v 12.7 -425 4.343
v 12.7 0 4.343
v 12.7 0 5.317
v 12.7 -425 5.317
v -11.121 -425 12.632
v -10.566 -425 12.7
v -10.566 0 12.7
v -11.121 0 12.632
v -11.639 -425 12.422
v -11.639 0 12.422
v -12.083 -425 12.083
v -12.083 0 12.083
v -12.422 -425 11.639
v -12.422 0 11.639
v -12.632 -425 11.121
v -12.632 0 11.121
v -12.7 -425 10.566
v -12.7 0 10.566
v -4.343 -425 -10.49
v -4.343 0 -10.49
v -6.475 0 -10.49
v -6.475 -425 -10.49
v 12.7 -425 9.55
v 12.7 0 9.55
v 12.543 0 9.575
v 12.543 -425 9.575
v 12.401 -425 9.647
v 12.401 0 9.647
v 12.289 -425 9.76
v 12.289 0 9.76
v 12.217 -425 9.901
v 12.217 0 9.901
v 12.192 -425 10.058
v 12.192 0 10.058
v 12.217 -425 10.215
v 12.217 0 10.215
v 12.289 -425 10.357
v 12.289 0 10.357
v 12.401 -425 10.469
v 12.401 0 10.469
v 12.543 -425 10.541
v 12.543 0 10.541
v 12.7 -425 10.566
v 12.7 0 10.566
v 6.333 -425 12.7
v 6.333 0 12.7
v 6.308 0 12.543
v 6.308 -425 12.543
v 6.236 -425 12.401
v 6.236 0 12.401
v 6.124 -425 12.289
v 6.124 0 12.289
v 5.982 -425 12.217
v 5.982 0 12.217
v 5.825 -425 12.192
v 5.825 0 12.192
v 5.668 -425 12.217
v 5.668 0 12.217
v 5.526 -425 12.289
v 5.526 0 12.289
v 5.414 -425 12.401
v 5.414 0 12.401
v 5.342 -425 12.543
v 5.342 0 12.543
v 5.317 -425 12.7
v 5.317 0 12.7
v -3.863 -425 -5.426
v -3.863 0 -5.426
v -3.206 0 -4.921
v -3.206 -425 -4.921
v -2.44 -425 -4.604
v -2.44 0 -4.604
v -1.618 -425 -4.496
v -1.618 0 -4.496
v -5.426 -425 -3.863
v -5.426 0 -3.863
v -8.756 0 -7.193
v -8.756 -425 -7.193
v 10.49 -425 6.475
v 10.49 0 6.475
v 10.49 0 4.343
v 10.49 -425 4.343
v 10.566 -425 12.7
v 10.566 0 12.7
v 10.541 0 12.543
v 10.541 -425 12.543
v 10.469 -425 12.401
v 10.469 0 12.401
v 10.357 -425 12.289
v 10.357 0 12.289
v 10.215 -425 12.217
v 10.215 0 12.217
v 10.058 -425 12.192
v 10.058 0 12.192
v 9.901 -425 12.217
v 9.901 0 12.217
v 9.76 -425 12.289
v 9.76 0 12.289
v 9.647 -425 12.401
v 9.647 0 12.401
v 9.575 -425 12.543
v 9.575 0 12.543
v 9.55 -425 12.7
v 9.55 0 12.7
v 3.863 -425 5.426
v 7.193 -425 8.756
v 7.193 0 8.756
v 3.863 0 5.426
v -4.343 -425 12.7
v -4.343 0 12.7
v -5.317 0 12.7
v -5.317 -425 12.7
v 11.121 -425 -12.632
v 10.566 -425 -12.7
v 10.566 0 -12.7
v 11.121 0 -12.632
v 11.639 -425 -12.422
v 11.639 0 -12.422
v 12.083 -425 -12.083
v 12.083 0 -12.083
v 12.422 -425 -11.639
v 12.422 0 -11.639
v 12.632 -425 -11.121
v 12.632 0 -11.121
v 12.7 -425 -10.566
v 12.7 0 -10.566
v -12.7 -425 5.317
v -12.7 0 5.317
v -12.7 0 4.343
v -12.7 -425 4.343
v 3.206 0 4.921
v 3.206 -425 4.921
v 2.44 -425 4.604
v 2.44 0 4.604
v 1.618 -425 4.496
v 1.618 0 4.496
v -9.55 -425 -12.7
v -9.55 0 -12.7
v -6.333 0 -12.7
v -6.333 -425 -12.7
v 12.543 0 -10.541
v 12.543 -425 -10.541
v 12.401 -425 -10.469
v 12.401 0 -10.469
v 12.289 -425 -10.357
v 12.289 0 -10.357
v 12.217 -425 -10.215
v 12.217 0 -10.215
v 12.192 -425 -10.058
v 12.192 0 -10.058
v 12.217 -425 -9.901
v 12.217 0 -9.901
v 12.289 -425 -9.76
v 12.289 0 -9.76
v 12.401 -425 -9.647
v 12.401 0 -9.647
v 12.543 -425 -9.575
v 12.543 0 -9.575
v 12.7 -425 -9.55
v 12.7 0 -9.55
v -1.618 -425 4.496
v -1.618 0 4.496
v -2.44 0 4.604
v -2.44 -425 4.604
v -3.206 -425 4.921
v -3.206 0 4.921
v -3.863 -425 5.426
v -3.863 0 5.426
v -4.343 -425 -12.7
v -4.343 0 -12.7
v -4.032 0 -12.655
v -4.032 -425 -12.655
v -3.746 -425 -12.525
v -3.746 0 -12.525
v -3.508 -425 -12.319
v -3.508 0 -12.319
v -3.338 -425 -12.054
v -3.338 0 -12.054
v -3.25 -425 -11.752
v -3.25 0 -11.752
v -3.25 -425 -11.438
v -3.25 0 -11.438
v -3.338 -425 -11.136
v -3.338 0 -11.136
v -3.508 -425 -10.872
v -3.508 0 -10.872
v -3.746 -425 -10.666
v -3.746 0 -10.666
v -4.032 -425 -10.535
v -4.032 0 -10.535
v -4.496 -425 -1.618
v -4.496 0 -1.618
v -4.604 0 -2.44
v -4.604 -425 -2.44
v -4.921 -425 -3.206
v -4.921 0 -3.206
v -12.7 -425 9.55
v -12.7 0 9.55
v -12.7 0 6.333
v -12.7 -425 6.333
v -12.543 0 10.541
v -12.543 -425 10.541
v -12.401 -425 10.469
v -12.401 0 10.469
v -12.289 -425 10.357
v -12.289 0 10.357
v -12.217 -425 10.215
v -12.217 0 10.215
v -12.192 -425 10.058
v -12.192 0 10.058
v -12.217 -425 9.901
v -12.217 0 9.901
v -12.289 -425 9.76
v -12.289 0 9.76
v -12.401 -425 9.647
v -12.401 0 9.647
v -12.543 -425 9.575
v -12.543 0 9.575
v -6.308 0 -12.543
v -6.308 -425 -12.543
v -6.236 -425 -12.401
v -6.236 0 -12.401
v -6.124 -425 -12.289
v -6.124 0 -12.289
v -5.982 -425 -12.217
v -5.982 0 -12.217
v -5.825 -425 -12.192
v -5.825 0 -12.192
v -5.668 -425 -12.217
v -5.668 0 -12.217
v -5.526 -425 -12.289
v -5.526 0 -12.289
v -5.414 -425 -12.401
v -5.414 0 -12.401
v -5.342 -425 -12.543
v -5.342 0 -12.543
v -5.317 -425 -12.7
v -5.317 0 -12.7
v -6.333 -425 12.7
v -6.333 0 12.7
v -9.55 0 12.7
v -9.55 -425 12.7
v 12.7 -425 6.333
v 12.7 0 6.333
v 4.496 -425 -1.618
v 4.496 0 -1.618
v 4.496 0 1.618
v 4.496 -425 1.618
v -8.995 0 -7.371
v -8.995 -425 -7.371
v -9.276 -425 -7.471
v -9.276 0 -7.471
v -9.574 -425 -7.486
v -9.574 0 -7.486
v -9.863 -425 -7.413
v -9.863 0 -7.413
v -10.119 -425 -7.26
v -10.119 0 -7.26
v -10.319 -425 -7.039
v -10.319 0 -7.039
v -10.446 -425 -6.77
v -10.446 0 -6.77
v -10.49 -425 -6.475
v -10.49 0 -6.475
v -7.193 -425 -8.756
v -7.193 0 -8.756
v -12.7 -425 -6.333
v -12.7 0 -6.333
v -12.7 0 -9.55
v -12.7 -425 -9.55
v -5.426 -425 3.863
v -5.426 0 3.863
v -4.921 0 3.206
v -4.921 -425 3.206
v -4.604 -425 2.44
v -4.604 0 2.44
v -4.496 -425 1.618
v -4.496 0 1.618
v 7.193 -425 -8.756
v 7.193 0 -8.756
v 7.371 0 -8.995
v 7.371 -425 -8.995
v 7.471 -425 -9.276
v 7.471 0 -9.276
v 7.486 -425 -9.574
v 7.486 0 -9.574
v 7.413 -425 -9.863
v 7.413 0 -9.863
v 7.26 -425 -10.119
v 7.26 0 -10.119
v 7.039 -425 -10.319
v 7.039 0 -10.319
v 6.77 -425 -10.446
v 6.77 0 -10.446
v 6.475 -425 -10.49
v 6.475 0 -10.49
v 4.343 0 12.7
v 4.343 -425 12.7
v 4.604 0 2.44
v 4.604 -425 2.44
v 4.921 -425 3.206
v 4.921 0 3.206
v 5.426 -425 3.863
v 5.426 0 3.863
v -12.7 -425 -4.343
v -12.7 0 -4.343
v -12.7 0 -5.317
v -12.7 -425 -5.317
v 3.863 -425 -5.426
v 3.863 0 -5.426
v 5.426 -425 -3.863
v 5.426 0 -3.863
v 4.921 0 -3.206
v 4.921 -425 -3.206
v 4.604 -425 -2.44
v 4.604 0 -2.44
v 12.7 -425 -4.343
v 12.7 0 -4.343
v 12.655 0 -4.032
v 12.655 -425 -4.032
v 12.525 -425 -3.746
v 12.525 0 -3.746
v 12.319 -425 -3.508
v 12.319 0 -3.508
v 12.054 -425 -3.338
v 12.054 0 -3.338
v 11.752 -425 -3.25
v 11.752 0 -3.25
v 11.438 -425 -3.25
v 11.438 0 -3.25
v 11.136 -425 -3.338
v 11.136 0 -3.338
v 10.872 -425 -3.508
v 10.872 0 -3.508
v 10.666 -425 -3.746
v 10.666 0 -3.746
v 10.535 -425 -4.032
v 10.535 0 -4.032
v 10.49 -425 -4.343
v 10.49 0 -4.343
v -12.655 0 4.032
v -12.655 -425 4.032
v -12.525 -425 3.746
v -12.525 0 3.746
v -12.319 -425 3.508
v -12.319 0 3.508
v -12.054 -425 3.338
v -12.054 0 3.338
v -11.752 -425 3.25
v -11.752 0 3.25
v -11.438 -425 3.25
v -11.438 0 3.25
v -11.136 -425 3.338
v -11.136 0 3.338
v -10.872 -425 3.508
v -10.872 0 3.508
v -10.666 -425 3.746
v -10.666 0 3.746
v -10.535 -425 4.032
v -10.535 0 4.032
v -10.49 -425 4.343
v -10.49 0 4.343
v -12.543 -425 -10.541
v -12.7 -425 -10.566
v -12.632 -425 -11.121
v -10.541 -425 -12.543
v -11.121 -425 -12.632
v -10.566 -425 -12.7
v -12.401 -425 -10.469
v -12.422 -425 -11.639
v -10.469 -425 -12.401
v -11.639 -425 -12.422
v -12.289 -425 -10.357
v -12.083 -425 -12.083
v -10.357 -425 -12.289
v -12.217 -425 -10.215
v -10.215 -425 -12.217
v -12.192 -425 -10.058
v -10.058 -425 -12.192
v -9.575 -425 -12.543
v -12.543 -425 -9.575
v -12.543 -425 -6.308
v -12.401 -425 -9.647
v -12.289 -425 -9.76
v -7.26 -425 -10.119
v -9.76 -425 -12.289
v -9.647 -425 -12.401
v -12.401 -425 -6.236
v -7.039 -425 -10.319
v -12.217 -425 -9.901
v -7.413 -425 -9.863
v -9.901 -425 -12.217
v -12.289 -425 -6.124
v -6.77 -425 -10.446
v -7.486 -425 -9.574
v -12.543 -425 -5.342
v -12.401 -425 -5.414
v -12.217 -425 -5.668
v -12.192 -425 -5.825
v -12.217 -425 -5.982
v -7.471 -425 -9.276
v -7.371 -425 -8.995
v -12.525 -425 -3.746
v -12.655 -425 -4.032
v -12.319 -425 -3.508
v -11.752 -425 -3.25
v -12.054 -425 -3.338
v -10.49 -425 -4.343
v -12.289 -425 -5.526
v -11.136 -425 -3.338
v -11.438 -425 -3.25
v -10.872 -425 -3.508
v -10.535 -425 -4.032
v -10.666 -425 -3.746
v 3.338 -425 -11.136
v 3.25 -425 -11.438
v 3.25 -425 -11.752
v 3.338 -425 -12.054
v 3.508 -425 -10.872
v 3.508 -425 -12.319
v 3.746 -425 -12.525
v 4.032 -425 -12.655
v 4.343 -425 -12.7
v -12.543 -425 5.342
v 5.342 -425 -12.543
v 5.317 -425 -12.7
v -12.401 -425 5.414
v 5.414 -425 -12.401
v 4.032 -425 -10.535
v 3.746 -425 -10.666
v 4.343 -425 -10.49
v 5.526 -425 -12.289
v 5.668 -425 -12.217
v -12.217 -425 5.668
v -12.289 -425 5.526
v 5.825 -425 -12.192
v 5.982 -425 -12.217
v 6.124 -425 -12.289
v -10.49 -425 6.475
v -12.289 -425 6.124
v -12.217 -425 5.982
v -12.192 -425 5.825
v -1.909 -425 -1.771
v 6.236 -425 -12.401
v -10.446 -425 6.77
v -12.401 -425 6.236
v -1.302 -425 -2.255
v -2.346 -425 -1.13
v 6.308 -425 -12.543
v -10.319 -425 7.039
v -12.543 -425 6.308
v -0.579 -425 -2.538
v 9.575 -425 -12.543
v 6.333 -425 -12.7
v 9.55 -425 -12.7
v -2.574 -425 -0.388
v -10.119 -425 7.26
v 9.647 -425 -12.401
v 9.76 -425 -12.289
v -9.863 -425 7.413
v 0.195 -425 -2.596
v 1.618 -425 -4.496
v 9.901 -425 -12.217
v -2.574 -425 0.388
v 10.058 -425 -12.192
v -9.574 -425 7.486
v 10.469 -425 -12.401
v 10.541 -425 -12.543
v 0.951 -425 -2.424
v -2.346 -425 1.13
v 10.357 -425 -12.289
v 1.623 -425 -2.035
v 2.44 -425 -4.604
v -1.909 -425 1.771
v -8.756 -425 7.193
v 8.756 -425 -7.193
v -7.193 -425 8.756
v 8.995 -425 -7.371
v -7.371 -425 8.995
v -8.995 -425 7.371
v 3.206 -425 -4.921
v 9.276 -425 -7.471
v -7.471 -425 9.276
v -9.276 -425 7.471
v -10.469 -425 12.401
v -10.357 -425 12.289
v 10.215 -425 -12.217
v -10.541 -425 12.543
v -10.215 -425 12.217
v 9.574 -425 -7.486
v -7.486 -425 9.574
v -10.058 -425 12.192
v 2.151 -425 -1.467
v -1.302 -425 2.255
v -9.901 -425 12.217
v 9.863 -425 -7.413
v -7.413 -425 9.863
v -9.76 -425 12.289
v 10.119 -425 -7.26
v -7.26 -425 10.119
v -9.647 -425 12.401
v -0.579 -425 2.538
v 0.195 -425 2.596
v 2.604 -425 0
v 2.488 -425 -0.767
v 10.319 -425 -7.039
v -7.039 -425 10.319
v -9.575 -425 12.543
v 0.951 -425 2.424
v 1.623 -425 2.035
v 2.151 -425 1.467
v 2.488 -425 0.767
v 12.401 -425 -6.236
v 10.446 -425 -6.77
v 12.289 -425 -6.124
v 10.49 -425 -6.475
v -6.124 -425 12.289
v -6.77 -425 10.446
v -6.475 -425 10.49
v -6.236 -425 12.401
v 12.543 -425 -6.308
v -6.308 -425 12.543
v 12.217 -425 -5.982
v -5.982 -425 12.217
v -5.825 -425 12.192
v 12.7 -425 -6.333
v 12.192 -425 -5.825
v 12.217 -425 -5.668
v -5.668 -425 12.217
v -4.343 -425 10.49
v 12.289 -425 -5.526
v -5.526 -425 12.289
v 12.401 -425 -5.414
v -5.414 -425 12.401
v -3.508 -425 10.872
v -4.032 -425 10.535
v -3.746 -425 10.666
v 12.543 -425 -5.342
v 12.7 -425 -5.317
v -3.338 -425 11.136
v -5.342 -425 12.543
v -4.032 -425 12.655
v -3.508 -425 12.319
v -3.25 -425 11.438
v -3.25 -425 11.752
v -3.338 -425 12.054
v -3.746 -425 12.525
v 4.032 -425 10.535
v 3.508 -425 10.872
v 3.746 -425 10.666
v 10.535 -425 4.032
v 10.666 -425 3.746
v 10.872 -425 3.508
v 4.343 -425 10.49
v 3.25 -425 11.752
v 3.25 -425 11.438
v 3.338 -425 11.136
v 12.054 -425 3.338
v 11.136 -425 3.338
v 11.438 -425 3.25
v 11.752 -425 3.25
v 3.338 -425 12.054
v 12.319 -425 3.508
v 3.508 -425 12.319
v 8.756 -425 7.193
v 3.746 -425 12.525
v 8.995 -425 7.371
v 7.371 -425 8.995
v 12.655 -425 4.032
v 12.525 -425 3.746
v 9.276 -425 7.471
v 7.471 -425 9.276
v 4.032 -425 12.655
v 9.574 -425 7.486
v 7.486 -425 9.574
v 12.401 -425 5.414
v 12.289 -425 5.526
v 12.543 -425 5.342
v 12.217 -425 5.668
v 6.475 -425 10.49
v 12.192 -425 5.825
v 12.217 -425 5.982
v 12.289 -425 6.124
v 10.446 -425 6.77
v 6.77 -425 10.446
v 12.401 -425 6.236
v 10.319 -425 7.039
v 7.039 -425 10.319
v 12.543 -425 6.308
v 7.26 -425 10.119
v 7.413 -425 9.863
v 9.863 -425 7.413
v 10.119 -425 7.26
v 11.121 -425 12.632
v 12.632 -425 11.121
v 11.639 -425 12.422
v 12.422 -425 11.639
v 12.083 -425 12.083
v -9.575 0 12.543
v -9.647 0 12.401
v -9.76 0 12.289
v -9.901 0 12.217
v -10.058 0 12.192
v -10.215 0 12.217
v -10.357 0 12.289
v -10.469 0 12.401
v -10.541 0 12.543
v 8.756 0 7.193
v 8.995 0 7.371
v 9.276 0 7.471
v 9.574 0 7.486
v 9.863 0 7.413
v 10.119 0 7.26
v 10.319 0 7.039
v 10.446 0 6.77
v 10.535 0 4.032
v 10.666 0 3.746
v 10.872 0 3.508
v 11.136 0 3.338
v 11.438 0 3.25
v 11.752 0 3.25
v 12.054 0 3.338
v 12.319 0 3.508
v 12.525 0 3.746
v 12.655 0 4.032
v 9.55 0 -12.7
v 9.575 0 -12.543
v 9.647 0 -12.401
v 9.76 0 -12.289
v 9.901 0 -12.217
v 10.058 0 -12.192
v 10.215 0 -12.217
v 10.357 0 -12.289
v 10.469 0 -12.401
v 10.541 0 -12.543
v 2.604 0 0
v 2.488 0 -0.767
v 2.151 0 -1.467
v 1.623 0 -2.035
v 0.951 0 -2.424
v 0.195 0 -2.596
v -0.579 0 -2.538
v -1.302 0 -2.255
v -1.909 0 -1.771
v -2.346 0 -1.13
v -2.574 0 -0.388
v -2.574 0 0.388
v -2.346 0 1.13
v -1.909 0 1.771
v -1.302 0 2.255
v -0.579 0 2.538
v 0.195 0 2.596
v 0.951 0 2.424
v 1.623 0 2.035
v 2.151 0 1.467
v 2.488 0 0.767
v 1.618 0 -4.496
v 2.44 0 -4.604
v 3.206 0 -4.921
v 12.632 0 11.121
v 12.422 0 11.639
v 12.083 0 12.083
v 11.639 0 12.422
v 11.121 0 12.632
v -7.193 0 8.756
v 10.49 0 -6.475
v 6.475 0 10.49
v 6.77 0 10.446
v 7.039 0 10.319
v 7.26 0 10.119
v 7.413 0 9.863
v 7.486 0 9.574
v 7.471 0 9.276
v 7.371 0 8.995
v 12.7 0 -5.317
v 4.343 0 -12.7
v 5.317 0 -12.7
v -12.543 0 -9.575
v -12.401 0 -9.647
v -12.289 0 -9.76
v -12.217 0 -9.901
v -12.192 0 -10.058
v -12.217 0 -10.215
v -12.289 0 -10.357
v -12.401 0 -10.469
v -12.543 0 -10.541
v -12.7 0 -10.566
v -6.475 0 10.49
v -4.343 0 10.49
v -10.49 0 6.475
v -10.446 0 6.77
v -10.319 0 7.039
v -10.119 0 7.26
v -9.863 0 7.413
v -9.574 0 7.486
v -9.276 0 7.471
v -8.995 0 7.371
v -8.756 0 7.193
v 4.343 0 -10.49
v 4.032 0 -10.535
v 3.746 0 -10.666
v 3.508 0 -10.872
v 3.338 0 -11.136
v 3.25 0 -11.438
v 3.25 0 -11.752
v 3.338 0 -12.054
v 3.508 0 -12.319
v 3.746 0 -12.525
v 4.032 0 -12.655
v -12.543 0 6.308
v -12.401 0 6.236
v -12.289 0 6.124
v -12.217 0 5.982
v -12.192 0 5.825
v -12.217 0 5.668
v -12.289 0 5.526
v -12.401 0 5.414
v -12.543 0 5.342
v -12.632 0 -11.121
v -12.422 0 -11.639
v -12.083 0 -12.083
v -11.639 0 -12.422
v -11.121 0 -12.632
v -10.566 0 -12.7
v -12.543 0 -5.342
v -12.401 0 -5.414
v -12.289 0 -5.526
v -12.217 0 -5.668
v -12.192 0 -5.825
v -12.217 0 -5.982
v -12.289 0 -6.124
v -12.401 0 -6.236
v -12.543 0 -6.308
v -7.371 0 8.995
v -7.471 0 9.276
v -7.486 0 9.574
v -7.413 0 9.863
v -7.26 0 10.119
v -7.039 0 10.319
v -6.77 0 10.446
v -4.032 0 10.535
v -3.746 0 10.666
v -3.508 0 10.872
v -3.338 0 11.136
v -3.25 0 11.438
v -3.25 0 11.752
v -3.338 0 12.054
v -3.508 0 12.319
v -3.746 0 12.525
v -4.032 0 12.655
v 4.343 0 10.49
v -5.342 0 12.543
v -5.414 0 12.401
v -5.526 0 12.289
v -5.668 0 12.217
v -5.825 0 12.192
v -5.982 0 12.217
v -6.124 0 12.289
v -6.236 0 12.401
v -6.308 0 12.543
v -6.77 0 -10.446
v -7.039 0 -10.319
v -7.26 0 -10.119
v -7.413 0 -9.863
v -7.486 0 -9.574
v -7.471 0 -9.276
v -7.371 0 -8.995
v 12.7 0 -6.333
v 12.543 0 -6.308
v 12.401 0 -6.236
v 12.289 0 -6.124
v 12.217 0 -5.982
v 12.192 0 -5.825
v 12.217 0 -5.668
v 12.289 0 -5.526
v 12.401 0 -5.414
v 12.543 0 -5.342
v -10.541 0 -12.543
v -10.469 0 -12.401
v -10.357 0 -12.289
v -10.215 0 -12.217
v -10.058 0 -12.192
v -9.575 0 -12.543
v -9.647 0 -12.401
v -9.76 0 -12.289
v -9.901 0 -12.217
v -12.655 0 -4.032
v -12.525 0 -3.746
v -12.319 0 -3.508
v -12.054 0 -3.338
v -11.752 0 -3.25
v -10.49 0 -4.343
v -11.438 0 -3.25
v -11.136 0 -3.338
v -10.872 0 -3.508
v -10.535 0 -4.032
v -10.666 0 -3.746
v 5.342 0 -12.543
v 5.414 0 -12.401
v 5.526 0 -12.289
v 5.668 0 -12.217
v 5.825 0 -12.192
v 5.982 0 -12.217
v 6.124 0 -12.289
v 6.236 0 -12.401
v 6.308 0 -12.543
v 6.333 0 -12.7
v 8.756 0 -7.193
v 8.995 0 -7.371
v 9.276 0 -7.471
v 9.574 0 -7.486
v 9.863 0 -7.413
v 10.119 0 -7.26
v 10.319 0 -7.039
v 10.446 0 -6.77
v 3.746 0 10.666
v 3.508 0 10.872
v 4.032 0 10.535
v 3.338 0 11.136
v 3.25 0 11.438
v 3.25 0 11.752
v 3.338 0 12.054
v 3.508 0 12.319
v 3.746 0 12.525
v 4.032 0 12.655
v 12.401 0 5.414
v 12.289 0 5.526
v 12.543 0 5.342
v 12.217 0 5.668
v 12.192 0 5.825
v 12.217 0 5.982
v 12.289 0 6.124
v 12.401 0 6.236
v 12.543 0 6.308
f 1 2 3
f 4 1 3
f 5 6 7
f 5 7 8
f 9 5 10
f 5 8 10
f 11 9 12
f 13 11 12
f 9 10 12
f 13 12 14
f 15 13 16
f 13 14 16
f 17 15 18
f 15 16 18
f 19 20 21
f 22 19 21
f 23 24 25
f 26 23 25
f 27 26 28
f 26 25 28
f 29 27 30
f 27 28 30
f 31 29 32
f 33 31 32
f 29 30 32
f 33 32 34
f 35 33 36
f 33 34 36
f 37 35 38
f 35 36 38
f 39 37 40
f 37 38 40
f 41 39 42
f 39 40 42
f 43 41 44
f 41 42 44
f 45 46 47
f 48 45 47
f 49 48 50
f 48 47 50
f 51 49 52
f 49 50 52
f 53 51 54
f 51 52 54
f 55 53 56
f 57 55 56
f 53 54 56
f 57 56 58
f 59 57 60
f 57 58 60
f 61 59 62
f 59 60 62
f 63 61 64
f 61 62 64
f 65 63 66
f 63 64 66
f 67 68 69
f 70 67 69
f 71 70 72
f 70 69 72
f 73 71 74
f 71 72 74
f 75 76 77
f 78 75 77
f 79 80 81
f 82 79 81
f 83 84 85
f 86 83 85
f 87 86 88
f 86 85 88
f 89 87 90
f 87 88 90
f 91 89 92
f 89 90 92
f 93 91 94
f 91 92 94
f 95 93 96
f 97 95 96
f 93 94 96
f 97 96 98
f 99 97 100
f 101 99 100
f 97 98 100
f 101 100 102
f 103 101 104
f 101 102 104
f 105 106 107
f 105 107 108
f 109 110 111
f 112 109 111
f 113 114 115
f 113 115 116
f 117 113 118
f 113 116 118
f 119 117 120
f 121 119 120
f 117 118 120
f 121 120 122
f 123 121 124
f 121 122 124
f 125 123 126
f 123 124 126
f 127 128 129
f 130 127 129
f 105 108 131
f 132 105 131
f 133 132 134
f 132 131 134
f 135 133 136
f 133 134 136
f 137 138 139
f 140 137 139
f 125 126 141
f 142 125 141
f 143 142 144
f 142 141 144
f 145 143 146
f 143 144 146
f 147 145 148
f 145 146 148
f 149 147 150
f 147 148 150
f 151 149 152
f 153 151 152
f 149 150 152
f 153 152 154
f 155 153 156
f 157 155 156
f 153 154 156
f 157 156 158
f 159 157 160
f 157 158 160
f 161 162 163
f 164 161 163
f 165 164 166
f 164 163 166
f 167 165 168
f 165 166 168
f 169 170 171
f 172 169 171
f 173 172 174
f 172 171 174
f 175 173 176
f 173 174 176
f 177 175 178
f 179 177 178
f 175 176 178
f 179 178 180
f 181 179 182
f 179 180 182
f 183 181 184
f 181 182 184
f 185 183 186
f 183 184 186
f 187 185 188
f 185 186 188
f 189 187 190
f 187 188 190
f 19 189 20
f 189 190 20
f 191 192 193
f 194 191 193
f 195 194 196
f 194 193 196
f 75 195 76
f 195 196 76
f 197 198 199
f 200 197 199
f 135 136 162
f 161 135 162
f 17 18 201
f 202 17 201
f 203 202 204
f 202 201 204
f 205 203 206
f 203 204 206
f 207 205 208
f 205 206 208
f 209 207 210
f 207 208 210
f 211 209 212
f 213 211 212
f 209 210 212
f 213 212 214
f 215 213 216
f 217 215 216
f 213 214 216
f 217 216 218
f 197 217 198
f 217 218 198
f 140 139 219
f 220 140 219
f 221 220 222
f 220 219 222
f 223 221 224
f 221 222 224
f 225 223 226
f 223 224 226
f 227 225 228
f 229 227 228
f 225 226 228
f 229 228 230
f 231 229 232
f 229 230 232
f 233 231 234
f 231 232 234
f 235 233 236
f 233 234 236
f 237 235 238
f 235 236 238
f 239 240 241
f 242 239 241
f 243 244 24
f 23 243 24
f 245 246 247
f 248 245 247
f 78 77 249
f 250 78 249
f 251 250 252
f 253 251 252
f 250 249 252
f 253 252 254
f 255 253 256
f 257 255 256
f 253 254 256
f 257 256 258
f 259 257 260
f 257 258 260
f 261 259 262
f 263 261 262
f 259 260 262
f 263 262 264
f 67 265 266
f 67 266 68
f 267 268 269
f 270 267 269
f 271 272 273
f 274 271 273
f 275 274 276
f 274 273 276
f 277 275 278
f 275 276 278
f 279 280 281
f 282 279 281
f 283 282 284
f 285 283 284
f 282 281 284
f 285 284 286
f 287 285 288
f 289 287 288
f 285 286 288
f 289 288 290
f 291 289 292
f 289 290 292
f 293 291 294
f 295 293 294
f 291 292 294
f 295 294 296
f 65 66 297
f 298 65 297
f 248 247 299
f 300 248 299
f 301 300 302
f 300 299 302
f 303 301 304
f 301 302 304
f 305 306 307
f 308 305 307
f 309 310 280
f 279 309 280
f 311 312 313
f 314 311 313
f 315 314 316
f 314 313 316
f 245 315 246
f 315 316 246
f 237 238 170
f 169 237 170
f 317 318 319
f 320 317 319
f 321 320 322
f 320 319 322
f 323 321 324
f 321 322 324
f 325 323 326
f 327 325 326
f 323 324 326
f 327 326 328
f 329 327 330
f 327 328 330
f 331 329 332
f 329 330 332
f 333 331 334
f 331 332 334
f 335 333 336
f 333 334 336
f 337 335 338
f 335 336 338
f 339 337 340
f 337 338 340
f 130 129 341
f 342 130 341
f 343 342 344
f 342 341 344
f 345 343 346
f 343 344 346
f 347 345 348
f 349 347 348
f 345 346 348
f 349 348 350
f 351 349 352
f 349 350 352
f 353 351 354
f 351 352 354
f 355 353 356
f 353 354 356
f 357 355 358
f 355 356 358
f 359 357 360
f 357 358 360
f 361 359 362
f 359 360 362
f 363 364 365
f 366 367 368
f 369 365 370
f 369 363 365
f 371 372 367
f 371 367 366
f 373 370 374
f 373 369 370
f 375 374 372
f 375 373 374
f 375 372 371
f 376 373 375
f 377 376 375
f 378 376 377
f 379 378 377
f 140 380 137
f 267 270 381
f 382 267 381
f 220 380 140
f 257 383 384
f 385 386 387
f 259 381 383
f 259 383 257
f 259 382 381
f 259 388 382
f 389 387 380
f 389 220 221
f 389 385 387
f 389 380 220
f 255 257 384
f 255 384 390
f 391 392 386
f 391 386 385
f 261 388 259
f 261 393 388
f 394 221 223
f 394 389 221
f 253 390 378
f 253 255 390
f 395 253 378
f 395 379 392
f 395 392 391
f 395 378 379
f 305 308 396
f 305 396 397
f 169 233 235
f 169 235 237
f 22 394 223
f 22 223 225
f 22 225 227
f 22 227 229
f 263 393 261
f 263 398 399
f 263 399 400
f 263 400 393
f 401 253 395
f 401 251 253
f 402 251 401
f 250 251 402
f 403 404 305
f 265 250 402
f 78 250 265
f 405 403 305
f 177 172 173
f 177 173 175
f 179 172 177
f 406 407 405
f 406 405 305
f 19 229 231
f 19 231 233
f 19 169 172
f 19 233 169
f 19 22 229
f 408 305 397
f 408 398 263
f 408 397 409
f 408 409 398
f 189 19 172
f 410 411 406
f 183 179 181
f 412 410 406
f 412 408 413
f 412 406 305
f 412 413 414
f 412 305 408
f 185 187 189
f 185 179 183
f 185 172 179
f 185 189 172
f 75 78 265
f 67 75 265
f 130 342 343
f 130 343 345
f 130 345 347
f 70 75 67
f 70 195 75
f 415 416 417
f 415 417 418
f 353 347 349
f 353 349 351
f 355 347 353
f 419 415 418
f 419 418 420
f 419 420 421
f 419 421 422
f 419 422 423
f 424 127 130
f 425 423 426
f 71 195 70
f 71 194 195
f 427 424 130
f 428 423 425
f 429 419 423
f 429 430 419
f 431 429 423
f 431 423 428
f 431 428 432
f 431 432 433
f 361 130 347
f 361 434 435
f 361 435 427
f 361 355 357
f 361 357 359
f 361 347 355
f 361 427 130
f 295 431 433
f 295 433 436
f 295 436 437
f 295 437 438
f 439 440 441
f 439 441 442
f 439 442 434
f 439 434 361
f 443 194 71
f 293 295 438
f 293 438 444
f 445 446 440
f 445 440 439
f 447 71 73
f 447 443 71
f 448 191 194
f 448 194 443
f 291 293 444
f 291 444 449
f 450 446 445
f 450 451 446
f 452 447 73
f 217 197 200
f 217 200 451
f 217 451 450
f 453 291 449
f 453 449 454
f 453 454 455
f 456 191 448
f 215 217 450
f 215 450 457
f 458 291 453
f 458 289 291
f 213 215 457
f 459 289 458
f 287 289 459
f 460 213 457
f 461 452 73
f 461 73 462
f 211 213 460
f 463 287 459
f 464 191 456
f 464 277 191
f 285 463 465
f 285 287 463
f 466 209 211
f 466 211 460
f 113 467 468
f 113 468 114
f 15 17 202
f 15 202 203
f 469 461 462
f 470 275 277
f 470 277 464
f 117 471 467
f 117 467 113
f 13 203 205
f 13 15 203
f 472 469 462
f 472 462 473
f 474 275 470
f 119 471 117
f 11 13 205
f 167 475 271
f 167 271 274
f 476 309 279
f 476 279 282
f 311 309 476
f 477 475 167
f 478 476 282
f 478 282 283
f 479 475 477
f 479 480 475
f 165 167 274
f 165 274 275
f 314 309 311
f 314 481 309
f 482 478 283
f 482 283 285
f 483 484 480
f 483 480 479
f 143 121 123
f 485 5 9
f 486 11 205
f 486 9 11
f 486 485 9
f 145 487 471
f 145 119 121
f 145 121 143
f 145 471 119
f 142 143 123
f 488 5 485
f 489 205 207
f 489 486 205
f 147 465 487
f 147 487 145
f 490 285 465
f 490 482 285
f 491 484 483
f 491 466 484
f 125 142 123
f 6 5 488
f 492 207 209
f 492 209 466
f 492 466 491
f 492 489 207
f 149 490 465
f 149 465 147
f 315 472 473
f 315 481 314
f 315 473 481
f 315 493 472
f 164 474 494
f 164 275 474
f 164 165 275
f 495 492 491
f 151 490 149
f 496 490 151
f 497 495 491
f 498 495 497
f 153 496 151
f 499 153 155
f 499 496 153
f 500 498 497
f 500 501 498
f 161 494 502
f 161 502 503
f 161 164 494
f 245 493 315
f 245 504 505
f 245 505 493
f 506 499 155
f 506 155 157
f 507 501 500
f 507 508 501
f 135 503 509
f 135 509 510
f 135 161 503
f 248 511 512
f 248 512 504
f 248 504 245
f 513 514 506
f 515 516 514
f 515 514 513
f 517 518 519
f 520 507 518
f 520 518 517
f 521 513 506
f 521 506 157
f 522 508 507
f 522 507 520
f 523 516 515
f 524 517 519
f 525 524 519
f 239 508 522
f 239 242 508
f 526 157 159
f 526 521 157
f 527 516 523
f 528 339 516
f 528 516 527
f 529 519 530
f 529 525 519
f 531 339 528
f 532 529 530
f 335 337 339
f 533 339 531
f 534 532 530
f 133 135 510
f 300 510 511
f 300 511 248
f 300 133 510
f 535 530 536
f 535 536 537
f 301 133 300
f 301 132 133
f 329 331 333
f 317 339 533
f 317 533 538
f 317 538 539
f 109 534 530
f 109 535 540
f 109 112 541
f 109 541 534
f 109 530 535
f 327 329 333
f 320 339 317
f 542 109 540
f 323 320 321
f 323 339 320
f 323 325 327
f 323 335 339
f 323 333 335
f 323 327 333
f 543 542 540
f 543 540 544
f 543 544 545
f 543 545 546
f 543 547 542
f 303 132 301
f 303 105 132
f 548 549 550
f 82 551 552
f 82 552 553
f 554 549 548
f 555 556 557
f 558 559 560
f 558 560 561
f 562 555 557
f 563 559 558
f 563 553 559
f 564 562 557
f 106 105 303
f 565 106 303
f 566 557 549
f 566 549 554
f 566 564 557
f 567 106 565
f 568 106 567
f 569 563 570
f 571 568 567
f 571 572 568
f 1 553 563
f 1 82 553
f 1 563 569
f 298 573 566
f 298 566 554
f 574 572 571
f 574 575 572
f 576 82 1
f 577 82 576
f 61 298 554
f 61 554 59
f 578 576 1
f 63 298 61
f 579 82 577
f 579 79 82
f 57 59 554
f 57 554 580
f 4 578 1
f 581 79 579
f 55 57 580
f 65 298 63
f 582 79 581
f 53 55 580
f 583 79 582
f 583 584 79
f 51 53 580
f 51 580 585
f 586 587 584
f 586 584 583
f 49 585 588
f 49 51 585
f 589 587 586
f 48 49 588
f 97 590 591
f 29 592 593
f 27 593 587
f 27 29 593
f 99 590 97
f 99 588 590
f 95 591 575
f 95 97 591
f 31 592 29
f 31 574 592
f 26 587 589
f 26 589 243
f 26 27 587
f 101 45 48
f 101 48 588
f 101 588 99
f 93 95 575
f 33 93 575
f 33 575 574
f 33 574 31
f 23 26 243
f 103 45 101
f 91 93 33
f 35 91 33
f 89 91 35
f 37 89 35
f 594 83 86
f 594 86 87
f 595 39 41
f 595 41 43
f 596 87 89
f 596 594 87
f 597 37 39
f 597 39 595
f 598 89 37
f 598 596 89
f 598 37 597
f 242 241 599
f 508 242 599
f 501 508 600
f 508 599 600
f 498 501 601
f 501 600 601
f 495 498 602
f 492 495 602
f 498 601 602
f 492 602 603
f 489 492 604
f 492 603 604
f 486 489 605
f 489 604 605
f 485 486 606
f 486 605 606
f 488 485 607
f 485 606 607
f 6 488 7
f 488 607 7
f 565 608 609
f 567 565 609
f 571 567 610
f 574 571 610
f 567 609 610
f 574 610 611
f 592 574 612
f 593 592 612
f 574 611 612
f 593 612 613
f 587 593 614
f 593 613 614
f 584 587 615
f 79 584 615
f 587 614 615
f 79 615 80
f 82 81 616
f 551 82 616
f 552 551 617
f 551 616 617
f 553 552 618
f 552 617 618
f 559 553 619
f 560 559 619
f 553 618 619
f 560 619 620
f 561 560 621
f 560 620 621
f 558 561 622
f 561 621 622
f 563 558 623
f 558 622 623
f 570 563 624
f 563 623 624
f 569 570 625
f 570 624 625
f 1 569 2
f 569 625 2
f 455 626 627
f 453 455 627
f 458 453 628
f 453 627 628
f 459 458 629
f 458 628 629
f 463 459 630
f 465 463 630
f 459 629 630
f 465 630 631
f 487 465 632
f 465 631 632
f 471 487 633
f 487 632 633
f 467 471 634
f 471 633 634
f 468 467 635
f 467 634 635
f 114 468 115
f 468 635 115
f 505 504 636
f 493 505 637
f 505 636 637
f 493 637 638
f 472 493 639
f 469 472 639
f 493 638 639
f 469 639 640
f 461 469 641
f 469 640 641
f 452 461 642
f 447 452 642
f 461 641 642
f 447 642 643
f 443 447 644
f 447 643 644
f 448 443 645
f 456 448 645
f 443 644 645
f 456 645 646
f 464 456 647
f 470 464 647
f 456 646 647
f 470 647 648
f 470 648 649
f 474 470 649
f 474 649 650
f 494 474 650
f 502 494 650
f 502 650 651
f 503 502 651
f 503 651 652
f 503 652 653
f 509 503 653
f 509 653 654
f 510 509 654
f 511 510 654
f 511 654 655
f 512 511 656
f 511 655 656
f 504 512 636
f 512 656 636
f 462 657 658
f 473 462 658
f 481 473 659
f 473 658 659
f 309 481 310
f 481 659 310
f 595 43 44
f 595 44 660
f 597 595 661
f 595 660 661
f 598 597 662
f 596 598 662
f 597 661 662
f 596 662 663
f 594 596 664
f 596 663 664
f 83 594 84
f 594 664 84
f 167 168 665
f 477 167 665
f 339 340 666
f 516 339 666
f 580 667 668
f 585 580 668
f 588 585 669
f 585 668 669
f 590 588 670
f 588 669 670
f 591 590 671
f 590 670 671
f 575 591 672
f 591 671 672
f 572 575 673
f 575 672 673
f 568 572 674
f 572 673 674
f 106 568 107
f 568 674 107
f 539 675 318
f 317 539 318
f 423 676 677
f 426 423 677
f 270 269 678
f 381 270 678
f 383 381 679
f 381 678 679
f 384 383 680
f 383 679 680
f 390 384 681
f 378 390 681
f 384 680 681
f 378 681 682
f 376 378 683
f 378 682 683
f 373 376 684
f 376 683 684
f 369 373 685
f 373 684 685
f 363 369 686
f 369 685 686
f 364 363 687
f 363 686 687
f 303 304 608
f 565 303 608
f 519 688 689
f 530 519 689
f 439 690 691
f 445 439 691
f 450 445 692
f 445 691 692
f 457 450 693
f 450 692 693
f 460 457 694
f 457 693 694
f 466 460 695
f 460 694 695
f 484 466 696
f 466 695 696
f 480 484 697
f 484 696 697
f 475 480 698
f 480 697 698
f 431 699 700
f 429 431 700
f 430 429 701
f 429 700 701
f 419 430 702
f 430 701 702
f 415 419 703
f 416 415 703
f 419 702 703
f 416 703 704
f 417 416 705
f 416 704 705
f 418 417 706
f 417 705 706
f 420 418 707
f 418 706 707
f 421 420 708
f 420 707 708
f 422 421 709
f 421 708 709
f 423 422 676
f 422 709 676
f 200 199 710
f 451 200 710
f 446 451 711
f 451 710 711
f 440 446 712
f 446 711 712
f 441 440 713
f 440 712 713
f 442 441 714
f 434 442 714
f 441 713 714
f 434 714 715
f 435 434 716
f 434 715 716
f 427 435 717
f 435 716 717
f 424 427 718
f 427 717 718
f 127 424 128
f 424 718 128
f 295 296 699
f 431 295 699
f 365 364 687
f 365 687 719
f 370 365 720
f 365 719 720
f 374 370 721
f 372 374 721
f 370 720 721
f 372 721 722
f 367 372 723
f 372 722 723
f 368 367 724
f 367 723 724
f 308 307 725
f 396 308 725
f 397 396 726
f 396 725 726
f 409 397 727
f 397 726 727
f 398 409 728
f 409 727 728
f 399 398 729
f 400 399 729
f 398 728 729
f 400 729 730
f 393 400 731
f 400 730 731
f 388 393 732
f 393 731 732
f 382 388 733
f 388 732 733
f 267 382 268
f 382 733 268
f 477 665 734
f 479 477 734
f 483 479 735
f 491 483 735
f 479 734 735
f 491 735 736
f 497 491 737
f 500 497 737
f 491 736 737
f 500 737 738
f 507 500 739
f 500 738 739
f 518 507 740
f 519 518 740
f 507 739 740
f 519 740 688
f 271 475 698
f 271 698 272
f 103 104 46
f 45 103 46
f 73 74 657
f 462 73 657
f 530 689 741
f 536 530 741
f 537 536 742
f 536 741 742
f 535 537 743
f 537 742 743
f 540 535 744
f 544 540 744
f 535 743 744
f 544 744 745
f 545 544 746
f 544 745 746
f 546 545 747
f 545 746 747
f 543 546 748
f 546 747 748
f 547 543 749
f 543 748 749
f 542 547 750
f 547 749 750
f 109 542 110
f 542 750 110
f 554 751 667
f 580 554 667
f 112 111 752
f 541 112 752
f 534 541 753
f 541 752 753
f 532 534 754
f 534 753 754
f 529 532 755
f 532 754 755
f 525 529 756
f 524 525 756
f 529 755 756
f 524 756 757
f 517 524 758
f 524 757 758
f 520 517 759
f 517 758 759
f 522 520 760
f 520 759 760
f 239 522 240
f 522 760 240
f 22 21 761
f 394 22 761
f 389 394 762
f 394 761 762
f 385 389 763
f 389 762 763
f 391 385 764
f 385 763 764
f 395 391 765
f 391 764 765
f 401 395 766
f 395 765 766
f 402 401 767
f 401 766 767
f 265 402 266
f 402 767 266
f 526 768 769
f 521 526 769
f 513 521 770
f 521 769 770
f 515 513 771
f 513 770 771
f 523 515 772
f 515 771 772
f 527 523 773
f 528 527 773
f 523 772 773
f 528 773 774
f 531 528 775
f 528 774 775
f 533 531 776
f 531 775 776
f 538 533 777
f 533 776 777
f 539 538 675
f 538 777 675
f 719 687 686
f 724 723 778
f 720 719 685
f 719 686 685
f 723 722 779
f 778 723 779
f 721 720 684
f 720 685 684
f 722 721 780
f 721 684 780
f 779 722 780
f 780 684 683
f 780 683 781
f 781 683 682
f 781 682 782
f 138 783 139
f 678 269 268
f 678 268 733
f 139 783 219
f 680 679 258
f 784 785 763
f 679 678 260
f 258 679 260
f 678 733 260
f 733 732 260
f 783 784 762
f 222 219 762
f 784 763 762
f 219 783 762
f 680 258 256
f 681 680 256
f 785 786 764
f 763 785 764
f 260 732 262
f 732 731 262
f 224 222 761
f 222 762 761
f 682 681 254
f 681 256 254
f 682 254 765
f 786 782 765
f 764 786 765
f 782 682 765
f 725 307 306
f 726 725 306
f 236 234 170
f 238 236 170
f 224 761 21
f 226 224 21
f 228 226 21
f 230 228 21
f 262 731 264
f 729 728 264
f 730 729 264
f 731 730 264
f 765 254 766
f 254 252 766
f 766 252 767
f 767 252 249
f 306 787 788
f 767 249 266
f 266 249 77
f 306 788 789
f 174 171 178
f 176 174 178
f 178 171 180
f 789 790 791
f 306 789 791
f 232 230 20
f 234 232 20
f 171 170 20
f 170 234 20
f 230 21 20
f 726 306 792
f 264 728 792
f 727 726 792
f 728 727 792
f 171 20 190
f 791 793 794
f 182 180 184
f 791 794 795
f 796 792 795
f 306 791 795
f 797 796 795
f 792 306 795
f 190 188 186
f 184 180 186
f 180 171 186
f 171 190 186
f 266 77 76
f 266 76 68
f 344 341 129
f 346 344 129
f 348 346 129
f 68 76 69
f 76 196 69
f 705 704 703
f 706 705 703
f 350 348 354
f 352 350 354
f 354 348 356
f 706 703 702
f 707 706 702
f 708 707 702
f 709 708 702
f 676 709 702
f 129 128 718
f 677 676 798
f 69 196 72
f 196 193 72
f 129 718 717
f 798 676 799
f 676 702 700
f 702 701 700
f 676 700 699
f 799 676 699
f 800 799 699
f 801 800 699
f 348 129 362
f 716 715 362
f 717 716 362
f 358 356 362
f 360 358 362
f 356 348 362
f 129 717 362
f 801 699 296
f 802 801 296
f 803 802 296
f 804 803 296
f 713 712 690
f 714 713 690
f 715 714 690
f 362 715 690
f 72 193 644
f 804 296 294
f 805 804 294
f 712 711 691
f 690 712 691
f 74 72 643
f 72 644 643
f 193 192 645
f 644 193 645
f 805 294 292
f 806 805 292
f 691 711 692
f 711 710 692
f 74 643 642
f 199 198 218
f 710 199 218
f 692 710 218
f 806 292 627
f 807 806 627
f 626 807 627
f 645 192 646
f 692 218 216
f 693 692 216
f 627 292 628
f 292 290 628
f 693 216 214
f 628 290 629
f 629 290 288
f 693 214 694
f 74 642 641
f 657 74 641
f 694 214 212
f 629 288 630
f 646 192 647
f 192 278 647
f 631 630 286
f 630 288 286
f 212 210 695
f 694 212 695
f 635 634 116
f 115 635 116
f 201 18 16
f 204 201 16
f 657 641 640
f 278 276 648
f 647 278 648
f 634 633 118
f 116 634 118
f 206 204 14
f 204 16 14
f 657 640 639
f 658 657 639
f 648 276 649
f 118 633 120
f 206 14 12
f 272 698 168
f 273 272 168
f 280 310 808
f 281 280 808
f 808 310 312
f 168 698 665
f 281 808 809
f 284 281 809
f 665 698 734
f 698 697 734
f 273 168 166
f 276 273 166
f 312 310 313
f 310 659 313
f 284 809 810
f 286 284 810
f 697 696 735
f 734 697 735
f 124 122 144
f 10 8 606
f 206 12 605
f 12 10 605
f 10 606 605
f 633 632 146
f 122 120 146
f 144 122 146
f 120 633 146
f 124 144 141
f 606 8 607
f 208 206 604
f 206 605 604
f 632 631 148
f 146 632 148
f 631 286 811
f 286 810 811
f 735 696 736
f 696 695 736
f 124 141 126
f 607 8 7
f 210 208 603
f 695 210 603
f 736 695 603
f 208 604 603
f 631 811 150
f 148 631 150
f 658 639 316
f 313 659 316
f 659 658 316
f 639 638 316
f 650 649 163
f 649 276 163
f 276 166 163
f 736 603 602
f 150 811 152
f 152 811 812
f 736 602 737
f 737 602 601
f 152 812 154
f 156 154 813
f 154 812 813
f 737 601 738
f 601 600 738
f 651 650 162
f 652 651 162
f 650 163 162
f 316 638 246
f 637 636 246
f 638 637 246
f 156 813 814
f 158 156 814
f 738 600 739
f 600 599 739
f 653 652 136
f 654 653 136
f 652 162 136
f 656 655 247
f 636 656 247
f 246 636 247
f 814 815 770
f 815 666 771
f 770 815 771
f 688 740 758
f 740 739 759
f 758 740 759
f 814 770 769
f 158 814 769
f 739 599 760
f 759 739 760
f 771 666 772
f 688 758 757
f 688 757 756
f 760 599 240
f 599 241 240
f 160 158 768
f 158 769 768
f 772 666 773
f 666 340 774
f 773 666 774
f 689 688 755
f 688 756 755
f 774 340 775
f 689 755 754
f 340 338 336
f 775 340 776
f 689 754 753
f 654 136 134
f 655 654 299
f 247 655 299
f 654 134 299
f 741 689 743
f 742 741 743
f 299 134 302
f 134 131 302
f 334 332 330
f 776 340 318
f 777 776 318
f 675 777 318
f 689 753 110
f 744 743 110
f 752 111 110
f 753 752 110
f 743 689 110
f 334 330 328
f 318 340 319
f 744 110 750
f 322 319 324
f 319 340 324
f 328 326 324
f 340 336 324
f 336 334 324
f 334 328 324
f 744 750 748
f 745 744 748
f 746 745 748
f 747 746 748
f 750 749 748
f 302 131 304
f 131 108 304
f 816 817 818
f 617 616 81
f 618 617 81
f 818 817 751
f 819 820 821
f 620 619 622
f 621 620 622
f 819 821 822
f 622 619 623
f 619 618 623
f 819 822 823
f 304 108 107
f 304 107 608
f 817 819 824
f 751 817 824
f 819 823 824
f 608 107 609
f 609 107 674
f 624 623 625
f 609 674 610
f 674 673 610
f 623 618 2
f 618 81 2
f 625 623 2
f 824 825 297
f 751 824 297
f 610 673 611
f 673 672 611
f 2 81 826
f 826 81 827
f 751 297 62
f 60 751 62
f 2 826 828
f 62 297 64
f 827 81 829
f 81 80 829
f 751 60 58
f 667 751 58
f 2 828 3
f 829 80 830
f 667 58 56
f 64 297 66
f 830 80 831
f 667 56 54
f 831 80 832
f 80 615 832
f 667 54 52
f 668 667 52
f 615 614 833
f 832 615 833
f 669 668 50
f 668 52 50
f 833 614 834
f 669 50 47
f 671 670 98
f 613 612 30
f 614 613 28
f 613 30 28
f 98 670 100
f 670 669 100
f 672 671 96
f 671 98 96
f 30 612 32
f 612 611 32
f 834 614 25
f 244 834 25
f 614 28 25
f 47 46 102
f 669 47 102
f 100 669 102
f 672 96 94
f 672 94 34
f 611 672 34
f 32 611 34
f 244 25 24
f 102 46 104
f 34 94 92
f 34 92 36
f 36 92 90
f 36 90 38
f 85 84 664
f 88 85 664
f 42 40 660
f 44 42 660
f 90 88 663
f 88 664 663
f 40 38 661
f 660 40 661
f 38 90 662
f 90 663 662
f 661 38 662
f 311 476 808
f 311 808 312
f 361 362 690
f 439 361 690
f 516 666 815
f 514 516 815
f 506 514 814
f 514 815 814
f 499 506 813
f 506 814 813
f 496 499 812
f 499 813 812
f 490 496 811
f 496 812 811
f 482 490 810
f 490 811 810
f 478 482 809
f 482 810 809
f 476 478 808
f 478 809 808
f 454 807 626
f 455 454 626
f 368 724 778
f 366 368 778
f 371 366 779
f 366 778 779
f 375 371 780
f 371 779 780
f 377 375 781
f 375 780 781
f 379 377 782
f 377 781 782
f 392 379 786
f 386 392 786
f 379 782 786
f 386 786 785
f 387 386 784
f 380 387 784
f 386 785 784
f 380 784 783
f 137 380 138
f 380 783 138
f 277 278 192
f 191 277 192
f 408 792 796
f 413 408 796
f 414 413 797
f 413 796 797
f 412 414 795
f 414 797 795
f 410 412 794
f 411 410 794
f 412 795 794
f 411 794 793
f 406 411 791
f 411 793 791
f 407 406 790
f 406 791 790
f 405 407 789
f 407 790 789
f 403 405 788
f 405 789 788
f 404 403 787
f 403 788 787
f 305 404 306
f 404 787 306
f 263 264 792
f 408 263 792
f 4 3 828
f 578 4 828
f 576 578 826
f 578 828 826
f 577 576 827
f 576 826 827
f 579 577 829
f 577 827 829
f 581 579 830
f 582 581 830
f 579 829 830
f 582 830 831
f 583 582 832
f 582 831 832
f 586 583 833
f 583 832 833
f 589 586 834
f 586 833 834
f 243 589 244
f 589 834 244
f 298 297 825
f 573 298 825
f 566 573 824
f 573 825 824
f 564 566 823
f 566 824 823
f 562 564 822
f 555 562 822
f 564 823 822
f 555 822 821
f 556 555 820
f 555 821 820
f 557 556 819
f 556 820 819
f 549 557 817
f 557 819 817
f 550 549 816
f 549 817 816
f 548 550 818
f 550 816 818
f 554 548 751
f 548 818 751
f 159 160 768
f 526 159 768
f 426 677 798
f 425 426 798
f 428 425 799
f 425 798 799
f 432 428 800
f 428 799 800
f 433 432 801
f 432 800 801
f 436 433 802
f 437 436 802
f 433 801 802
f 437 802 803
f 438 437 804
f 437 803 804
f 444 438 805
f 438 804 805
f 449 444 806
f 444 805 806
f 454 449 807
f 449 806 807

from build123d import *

# Parameters (mm, degrees)
F1_DEPTH = 425


# Not quite as in the source:
# - ends of sketch curves that miss each other by under 0.0002 mm in the source are joined


with BuildPart() as f1:
    # F0 (on Front) → F1 (new body)
    with BuildSketch(Plane.XZ):
        with BuildLine():
            ThreePointArc((-12.7, -9.5504), (-12.1920000057, -10.0583238), (-12.6998476, -10.5663999771))
            ThreePointArc((-12.6998476, -10.5663999771), (-12.0825225161, -12.0825225161), (-10.5664000074, -12.6998469825))
            ThreePointArc((-10.5664000074, -12.6998469825), (-10.0583238, -12.1920000057), (-9.5504, -12.7))
            Line((-9.5504, -12.7), (-6.3330836, -12.7))
            ThreePointArc((-6.3330836, -12.7), (-5.8250836, -12.192), (-5.3170836, -12.7))
            Line((-5.3170836, -12.7), (-4.3434, -12.7))
            ThreePointArc((-4.3434, -12.7), (-3.2385, -11.5951), (-4.3434, -10.4902))
            Line((-4.3434, -10.4902), (-6.4747902, -10.4902))
            ThreePointArc((-6.4747902, -10.4902), (-7.413451805, -9.8630063673), (-7.1932106897, -8.7557795103))
            Line((-7.1932106897, -8.7557795103), (-3.8631622, -5.4257448))
            ThreePointArc((-3.8631622, -5.4257448), (-2.8331268978, -4.7374824843), (-1.618107, -4.4958))
            Line((-1.618107, -4.4958), (1.618107, -4.4958))
            ThreePointArc((1.618107, -4.4958), (2.8331268978, -4.7374824843), (3.8631710303, -5.4257359697))
            Line((3.8631710303, -5.4257359697), (7.1932038, -8.7557864))
            ThreePointArc((7.1932038, -8.7557864), (7.413451805, -9.8630063673), (6.4747902, -10.4902))
            Line((6.4747902, -10.4902), (4.3434, -10.4902))
            ThreePointArc((4.3434, -10.4902), (3.2385, -11.5951), (4.3434, -12.7))
            Line((4.3434, -12.7), (5.3170836, -12.7))
            ThreePointArc((5.3170836, -12.7), (5.8250836, -12.192), (6.3330836, -12.7))
            Line((6.3330836, -12.7), (9.5504, -12.7))
            ThreePointArc((9.5504, -12.7), (10.0583238, -12.1920000057), (10.5663999771, -12.6998476))
            ThreePointArc((10.5663999771, -12.6998476), (12.0825225161, -12.0825225161), (12.6998469825, -10.5664000074))
            ThreePointArc((12.6998469825, -10.5664000074), (12.1920000057, -10.0583238), (12.7, -9.5504))
            Line((12.7, -9.5504), (12.7, -6.3330836))
            ThreePointArc((12.7, -6.3330836), (12.192, -5.8250836), (12.7, -5.3170836))
            Line((12.7, -5.3170836), (12.7, -4.3434))
            ThreePointArc((12.7, -4.3434), (11.5951, -3.2385), (10.4902, -4.3434))
            Line((10.4902, -4.3434), (10.4902, -6.4747902))
            ThreePointArc((10.4902, -6.4747902), (9.8630063673, -7.413451805), (8.7557795103, -7.1932106897))
            Line((8.7557795103, -7.1932106897), (5.4257448, -3.8631622))
            ThreePointArc((5.4257448, -3.8631622), (4.7374824843, -2.8331268978), (4.4958, -1.618107))
            Line((4.4958, -1.618107), (4.4958, 1.618107))
            ThreePointArc((4.4958, 1.618107), (4.7374824843, 2.8331268978), (5.4257359697, 3.8631710303))
            Line((5.4257359697, 3.8631710303), (8.7557864, 7.1932038))
            ThreePointArc((8.7557864, 7.1932038), (9.8630063673, 7.413451805), (10.4902, 6.4747902))
            Line((10.4902, 6.4747902), (10.4902, 4.3434))
            ThreePointArc((10.4902, 4.3434), (11.5951, 3.2385), (12.7, 4.3434))
            Line((12.7, 4.3434), (12.7, 5.3170836))
            ThreePointArc((12.7, 5.3170836), (12.192, 5.8250836), (12.7, 6.3330836))
            Line((12.7, 6.3330836), (12.7, 9.5504))
            ThreePointArc((12.7, 9.5504), (12.1920000057, 10.0583238), (12.6998476, 10.5663999771))
            ThreePointArc((12.6998476, 10.5663999771), (12.0825225161, 12.0825225161), (10.5664000074, 12.6998469825))
            ThreePointArc((10.5664000074, 12.6998469825), (10.0583238, 12.1920000057), (9.5504, 12.7))
            Line((9.5504, 12.7), (6.3330836, 12.7))
            ThreePointArc((6.3330836, 12.7), (5.8250836, 12.192), (5.3170836, 12.7))
            Line((5.3170836, 12.7), (4.3434, 12.7))
            ThreePointArc((4.3434, 12.7), (3.2385, 11.5951), (4.3434, 10.4902))
            Line((4.3434, 10.4902), (6.4747902, 10.4902))
            ThreePointArc((6.4747902, 10.4902), (7.413451805, 9.8630063673), (7.1932106897, 8.7557795103))
            Line((7.1932106897, 8.7557795103), (3.8631622, 5.4257448))
            ThreePointArc((3.8631622, 5.4257448), (2.8331268978, 4.7374824843), (1.618107, 4.4958))
            Line((1.618107, 4.4958), (-1.618107, 4.4958))
            ThreePointArc((-1.618107, 4.4958), (-2.8331268978, 4.7374824843), (-3.8631710303, 5.4257359697))
            Line((-3.8631710303, 5.4257359697), (-7.1932038, 8.7557864))
            ThreePointArc((-7.1932038, 8.7557864), (-7.413451805, 9.8630063673), (-6.4747902, 10.4902))
            Line((-6.4747902, 10.4902), (-4.3434, 10.4902))
            ThreePointArc((-4.3434, 10.4902), (-3.2385, 11.5951), (-4.3434, 12.7))
            Line((-4.3434, 12.7), (-5.3170836, 12.7))
            ThreePointArc((-5.3170836, 12.7), (-5.8250836, 12.192), (-6.3330836, 12.7))
            Line((-6.3330836, 12.7), (-9.5504, 12.7))
            ThreePointArc((-9.5504, 12.7), (-10.0583238, 12.1920000057), (-10.5663999771, 12.6998476))
            ThreePointArc((-10.5663999771, 12.6998476), (-12.0825225161, 12.0825225161), (-12.6998469825, 10.5664000074))
            ThreePointArc((-12.6998469825, 10.5664000074), (-12.1920000057, 10.0583238), (-12.7, 9.5504))
            Line((-12.7, 9.5504), (-12.7, 6.3330836))
            ThreePointArc((-12.7, 6.3330836), (-12.192, 5.8250836), (-12.7, 5.3170836))
            Line((-12.7, 5.3170836), (-12.7, 4.3434))
            ThreePointArc((-12.7, 4.3434), (-11.5951, 3.2385), (-10.4902, 4.3434))
            Line((-10.4902, 4.3434), (-10.4902, 6.4747902))
            ThreePointArc((-10.4902, 6.4747902), (-9.8630063673, 7.413451805), (-8.7557795103, 7.1932106897))
            Line((-8.7557795103, 7.1932106897), (-5.4257448, 3.8631622))
            ThreePointArc((-5.4257448, 3.8631622), (-4.7374824843, 2.8331268978), (-4.4958, 1.618107))
            Line((-4.4958, 1.618107), (-4.4958, -1.618107))
            ThreePointArc((-4.4958, -1.618107), (-4.7374824843, -2.8331268978), (-5.4257359697, -3.8631710303))
            Line((-5.4257359697, -3.8631710303), (-8.7557864, -7.1932038))
            ThreePointArc((-8.7557864, -7.1932038), (-9.8630063673, -7.413451805), (-10.4902, -6.4747902))
            Line((-10.4902, -6.4747902), (-10.4902, -4.3434))
            ThreePointArc((-10.4902, -4.3434), (-11.5951, -3.2385), (-12.7, -4.3434))
            Line((-12.7, -4.3434), (-12.7, -5.3170836))
            ThreePointArc((-12.7, -5.3170836), (-12.192, -5.8250836), (-12.7, -6.3330836))
            Line((-12.7, -6.3330836), (-12.7, -9.5504))
        make_face()
        with BuildLine():
            ThreePointArc((-2.6035, 0), (0, 2.6035), (2.6035, 0))
            ThreePointArc((2.6035, 0), (0, -2.6035), (-2.6035, 0))
        make_face(mode=Mode.SUBTRACT)
    extrude(amount=F1_DEPTH)


solid = f1.part
